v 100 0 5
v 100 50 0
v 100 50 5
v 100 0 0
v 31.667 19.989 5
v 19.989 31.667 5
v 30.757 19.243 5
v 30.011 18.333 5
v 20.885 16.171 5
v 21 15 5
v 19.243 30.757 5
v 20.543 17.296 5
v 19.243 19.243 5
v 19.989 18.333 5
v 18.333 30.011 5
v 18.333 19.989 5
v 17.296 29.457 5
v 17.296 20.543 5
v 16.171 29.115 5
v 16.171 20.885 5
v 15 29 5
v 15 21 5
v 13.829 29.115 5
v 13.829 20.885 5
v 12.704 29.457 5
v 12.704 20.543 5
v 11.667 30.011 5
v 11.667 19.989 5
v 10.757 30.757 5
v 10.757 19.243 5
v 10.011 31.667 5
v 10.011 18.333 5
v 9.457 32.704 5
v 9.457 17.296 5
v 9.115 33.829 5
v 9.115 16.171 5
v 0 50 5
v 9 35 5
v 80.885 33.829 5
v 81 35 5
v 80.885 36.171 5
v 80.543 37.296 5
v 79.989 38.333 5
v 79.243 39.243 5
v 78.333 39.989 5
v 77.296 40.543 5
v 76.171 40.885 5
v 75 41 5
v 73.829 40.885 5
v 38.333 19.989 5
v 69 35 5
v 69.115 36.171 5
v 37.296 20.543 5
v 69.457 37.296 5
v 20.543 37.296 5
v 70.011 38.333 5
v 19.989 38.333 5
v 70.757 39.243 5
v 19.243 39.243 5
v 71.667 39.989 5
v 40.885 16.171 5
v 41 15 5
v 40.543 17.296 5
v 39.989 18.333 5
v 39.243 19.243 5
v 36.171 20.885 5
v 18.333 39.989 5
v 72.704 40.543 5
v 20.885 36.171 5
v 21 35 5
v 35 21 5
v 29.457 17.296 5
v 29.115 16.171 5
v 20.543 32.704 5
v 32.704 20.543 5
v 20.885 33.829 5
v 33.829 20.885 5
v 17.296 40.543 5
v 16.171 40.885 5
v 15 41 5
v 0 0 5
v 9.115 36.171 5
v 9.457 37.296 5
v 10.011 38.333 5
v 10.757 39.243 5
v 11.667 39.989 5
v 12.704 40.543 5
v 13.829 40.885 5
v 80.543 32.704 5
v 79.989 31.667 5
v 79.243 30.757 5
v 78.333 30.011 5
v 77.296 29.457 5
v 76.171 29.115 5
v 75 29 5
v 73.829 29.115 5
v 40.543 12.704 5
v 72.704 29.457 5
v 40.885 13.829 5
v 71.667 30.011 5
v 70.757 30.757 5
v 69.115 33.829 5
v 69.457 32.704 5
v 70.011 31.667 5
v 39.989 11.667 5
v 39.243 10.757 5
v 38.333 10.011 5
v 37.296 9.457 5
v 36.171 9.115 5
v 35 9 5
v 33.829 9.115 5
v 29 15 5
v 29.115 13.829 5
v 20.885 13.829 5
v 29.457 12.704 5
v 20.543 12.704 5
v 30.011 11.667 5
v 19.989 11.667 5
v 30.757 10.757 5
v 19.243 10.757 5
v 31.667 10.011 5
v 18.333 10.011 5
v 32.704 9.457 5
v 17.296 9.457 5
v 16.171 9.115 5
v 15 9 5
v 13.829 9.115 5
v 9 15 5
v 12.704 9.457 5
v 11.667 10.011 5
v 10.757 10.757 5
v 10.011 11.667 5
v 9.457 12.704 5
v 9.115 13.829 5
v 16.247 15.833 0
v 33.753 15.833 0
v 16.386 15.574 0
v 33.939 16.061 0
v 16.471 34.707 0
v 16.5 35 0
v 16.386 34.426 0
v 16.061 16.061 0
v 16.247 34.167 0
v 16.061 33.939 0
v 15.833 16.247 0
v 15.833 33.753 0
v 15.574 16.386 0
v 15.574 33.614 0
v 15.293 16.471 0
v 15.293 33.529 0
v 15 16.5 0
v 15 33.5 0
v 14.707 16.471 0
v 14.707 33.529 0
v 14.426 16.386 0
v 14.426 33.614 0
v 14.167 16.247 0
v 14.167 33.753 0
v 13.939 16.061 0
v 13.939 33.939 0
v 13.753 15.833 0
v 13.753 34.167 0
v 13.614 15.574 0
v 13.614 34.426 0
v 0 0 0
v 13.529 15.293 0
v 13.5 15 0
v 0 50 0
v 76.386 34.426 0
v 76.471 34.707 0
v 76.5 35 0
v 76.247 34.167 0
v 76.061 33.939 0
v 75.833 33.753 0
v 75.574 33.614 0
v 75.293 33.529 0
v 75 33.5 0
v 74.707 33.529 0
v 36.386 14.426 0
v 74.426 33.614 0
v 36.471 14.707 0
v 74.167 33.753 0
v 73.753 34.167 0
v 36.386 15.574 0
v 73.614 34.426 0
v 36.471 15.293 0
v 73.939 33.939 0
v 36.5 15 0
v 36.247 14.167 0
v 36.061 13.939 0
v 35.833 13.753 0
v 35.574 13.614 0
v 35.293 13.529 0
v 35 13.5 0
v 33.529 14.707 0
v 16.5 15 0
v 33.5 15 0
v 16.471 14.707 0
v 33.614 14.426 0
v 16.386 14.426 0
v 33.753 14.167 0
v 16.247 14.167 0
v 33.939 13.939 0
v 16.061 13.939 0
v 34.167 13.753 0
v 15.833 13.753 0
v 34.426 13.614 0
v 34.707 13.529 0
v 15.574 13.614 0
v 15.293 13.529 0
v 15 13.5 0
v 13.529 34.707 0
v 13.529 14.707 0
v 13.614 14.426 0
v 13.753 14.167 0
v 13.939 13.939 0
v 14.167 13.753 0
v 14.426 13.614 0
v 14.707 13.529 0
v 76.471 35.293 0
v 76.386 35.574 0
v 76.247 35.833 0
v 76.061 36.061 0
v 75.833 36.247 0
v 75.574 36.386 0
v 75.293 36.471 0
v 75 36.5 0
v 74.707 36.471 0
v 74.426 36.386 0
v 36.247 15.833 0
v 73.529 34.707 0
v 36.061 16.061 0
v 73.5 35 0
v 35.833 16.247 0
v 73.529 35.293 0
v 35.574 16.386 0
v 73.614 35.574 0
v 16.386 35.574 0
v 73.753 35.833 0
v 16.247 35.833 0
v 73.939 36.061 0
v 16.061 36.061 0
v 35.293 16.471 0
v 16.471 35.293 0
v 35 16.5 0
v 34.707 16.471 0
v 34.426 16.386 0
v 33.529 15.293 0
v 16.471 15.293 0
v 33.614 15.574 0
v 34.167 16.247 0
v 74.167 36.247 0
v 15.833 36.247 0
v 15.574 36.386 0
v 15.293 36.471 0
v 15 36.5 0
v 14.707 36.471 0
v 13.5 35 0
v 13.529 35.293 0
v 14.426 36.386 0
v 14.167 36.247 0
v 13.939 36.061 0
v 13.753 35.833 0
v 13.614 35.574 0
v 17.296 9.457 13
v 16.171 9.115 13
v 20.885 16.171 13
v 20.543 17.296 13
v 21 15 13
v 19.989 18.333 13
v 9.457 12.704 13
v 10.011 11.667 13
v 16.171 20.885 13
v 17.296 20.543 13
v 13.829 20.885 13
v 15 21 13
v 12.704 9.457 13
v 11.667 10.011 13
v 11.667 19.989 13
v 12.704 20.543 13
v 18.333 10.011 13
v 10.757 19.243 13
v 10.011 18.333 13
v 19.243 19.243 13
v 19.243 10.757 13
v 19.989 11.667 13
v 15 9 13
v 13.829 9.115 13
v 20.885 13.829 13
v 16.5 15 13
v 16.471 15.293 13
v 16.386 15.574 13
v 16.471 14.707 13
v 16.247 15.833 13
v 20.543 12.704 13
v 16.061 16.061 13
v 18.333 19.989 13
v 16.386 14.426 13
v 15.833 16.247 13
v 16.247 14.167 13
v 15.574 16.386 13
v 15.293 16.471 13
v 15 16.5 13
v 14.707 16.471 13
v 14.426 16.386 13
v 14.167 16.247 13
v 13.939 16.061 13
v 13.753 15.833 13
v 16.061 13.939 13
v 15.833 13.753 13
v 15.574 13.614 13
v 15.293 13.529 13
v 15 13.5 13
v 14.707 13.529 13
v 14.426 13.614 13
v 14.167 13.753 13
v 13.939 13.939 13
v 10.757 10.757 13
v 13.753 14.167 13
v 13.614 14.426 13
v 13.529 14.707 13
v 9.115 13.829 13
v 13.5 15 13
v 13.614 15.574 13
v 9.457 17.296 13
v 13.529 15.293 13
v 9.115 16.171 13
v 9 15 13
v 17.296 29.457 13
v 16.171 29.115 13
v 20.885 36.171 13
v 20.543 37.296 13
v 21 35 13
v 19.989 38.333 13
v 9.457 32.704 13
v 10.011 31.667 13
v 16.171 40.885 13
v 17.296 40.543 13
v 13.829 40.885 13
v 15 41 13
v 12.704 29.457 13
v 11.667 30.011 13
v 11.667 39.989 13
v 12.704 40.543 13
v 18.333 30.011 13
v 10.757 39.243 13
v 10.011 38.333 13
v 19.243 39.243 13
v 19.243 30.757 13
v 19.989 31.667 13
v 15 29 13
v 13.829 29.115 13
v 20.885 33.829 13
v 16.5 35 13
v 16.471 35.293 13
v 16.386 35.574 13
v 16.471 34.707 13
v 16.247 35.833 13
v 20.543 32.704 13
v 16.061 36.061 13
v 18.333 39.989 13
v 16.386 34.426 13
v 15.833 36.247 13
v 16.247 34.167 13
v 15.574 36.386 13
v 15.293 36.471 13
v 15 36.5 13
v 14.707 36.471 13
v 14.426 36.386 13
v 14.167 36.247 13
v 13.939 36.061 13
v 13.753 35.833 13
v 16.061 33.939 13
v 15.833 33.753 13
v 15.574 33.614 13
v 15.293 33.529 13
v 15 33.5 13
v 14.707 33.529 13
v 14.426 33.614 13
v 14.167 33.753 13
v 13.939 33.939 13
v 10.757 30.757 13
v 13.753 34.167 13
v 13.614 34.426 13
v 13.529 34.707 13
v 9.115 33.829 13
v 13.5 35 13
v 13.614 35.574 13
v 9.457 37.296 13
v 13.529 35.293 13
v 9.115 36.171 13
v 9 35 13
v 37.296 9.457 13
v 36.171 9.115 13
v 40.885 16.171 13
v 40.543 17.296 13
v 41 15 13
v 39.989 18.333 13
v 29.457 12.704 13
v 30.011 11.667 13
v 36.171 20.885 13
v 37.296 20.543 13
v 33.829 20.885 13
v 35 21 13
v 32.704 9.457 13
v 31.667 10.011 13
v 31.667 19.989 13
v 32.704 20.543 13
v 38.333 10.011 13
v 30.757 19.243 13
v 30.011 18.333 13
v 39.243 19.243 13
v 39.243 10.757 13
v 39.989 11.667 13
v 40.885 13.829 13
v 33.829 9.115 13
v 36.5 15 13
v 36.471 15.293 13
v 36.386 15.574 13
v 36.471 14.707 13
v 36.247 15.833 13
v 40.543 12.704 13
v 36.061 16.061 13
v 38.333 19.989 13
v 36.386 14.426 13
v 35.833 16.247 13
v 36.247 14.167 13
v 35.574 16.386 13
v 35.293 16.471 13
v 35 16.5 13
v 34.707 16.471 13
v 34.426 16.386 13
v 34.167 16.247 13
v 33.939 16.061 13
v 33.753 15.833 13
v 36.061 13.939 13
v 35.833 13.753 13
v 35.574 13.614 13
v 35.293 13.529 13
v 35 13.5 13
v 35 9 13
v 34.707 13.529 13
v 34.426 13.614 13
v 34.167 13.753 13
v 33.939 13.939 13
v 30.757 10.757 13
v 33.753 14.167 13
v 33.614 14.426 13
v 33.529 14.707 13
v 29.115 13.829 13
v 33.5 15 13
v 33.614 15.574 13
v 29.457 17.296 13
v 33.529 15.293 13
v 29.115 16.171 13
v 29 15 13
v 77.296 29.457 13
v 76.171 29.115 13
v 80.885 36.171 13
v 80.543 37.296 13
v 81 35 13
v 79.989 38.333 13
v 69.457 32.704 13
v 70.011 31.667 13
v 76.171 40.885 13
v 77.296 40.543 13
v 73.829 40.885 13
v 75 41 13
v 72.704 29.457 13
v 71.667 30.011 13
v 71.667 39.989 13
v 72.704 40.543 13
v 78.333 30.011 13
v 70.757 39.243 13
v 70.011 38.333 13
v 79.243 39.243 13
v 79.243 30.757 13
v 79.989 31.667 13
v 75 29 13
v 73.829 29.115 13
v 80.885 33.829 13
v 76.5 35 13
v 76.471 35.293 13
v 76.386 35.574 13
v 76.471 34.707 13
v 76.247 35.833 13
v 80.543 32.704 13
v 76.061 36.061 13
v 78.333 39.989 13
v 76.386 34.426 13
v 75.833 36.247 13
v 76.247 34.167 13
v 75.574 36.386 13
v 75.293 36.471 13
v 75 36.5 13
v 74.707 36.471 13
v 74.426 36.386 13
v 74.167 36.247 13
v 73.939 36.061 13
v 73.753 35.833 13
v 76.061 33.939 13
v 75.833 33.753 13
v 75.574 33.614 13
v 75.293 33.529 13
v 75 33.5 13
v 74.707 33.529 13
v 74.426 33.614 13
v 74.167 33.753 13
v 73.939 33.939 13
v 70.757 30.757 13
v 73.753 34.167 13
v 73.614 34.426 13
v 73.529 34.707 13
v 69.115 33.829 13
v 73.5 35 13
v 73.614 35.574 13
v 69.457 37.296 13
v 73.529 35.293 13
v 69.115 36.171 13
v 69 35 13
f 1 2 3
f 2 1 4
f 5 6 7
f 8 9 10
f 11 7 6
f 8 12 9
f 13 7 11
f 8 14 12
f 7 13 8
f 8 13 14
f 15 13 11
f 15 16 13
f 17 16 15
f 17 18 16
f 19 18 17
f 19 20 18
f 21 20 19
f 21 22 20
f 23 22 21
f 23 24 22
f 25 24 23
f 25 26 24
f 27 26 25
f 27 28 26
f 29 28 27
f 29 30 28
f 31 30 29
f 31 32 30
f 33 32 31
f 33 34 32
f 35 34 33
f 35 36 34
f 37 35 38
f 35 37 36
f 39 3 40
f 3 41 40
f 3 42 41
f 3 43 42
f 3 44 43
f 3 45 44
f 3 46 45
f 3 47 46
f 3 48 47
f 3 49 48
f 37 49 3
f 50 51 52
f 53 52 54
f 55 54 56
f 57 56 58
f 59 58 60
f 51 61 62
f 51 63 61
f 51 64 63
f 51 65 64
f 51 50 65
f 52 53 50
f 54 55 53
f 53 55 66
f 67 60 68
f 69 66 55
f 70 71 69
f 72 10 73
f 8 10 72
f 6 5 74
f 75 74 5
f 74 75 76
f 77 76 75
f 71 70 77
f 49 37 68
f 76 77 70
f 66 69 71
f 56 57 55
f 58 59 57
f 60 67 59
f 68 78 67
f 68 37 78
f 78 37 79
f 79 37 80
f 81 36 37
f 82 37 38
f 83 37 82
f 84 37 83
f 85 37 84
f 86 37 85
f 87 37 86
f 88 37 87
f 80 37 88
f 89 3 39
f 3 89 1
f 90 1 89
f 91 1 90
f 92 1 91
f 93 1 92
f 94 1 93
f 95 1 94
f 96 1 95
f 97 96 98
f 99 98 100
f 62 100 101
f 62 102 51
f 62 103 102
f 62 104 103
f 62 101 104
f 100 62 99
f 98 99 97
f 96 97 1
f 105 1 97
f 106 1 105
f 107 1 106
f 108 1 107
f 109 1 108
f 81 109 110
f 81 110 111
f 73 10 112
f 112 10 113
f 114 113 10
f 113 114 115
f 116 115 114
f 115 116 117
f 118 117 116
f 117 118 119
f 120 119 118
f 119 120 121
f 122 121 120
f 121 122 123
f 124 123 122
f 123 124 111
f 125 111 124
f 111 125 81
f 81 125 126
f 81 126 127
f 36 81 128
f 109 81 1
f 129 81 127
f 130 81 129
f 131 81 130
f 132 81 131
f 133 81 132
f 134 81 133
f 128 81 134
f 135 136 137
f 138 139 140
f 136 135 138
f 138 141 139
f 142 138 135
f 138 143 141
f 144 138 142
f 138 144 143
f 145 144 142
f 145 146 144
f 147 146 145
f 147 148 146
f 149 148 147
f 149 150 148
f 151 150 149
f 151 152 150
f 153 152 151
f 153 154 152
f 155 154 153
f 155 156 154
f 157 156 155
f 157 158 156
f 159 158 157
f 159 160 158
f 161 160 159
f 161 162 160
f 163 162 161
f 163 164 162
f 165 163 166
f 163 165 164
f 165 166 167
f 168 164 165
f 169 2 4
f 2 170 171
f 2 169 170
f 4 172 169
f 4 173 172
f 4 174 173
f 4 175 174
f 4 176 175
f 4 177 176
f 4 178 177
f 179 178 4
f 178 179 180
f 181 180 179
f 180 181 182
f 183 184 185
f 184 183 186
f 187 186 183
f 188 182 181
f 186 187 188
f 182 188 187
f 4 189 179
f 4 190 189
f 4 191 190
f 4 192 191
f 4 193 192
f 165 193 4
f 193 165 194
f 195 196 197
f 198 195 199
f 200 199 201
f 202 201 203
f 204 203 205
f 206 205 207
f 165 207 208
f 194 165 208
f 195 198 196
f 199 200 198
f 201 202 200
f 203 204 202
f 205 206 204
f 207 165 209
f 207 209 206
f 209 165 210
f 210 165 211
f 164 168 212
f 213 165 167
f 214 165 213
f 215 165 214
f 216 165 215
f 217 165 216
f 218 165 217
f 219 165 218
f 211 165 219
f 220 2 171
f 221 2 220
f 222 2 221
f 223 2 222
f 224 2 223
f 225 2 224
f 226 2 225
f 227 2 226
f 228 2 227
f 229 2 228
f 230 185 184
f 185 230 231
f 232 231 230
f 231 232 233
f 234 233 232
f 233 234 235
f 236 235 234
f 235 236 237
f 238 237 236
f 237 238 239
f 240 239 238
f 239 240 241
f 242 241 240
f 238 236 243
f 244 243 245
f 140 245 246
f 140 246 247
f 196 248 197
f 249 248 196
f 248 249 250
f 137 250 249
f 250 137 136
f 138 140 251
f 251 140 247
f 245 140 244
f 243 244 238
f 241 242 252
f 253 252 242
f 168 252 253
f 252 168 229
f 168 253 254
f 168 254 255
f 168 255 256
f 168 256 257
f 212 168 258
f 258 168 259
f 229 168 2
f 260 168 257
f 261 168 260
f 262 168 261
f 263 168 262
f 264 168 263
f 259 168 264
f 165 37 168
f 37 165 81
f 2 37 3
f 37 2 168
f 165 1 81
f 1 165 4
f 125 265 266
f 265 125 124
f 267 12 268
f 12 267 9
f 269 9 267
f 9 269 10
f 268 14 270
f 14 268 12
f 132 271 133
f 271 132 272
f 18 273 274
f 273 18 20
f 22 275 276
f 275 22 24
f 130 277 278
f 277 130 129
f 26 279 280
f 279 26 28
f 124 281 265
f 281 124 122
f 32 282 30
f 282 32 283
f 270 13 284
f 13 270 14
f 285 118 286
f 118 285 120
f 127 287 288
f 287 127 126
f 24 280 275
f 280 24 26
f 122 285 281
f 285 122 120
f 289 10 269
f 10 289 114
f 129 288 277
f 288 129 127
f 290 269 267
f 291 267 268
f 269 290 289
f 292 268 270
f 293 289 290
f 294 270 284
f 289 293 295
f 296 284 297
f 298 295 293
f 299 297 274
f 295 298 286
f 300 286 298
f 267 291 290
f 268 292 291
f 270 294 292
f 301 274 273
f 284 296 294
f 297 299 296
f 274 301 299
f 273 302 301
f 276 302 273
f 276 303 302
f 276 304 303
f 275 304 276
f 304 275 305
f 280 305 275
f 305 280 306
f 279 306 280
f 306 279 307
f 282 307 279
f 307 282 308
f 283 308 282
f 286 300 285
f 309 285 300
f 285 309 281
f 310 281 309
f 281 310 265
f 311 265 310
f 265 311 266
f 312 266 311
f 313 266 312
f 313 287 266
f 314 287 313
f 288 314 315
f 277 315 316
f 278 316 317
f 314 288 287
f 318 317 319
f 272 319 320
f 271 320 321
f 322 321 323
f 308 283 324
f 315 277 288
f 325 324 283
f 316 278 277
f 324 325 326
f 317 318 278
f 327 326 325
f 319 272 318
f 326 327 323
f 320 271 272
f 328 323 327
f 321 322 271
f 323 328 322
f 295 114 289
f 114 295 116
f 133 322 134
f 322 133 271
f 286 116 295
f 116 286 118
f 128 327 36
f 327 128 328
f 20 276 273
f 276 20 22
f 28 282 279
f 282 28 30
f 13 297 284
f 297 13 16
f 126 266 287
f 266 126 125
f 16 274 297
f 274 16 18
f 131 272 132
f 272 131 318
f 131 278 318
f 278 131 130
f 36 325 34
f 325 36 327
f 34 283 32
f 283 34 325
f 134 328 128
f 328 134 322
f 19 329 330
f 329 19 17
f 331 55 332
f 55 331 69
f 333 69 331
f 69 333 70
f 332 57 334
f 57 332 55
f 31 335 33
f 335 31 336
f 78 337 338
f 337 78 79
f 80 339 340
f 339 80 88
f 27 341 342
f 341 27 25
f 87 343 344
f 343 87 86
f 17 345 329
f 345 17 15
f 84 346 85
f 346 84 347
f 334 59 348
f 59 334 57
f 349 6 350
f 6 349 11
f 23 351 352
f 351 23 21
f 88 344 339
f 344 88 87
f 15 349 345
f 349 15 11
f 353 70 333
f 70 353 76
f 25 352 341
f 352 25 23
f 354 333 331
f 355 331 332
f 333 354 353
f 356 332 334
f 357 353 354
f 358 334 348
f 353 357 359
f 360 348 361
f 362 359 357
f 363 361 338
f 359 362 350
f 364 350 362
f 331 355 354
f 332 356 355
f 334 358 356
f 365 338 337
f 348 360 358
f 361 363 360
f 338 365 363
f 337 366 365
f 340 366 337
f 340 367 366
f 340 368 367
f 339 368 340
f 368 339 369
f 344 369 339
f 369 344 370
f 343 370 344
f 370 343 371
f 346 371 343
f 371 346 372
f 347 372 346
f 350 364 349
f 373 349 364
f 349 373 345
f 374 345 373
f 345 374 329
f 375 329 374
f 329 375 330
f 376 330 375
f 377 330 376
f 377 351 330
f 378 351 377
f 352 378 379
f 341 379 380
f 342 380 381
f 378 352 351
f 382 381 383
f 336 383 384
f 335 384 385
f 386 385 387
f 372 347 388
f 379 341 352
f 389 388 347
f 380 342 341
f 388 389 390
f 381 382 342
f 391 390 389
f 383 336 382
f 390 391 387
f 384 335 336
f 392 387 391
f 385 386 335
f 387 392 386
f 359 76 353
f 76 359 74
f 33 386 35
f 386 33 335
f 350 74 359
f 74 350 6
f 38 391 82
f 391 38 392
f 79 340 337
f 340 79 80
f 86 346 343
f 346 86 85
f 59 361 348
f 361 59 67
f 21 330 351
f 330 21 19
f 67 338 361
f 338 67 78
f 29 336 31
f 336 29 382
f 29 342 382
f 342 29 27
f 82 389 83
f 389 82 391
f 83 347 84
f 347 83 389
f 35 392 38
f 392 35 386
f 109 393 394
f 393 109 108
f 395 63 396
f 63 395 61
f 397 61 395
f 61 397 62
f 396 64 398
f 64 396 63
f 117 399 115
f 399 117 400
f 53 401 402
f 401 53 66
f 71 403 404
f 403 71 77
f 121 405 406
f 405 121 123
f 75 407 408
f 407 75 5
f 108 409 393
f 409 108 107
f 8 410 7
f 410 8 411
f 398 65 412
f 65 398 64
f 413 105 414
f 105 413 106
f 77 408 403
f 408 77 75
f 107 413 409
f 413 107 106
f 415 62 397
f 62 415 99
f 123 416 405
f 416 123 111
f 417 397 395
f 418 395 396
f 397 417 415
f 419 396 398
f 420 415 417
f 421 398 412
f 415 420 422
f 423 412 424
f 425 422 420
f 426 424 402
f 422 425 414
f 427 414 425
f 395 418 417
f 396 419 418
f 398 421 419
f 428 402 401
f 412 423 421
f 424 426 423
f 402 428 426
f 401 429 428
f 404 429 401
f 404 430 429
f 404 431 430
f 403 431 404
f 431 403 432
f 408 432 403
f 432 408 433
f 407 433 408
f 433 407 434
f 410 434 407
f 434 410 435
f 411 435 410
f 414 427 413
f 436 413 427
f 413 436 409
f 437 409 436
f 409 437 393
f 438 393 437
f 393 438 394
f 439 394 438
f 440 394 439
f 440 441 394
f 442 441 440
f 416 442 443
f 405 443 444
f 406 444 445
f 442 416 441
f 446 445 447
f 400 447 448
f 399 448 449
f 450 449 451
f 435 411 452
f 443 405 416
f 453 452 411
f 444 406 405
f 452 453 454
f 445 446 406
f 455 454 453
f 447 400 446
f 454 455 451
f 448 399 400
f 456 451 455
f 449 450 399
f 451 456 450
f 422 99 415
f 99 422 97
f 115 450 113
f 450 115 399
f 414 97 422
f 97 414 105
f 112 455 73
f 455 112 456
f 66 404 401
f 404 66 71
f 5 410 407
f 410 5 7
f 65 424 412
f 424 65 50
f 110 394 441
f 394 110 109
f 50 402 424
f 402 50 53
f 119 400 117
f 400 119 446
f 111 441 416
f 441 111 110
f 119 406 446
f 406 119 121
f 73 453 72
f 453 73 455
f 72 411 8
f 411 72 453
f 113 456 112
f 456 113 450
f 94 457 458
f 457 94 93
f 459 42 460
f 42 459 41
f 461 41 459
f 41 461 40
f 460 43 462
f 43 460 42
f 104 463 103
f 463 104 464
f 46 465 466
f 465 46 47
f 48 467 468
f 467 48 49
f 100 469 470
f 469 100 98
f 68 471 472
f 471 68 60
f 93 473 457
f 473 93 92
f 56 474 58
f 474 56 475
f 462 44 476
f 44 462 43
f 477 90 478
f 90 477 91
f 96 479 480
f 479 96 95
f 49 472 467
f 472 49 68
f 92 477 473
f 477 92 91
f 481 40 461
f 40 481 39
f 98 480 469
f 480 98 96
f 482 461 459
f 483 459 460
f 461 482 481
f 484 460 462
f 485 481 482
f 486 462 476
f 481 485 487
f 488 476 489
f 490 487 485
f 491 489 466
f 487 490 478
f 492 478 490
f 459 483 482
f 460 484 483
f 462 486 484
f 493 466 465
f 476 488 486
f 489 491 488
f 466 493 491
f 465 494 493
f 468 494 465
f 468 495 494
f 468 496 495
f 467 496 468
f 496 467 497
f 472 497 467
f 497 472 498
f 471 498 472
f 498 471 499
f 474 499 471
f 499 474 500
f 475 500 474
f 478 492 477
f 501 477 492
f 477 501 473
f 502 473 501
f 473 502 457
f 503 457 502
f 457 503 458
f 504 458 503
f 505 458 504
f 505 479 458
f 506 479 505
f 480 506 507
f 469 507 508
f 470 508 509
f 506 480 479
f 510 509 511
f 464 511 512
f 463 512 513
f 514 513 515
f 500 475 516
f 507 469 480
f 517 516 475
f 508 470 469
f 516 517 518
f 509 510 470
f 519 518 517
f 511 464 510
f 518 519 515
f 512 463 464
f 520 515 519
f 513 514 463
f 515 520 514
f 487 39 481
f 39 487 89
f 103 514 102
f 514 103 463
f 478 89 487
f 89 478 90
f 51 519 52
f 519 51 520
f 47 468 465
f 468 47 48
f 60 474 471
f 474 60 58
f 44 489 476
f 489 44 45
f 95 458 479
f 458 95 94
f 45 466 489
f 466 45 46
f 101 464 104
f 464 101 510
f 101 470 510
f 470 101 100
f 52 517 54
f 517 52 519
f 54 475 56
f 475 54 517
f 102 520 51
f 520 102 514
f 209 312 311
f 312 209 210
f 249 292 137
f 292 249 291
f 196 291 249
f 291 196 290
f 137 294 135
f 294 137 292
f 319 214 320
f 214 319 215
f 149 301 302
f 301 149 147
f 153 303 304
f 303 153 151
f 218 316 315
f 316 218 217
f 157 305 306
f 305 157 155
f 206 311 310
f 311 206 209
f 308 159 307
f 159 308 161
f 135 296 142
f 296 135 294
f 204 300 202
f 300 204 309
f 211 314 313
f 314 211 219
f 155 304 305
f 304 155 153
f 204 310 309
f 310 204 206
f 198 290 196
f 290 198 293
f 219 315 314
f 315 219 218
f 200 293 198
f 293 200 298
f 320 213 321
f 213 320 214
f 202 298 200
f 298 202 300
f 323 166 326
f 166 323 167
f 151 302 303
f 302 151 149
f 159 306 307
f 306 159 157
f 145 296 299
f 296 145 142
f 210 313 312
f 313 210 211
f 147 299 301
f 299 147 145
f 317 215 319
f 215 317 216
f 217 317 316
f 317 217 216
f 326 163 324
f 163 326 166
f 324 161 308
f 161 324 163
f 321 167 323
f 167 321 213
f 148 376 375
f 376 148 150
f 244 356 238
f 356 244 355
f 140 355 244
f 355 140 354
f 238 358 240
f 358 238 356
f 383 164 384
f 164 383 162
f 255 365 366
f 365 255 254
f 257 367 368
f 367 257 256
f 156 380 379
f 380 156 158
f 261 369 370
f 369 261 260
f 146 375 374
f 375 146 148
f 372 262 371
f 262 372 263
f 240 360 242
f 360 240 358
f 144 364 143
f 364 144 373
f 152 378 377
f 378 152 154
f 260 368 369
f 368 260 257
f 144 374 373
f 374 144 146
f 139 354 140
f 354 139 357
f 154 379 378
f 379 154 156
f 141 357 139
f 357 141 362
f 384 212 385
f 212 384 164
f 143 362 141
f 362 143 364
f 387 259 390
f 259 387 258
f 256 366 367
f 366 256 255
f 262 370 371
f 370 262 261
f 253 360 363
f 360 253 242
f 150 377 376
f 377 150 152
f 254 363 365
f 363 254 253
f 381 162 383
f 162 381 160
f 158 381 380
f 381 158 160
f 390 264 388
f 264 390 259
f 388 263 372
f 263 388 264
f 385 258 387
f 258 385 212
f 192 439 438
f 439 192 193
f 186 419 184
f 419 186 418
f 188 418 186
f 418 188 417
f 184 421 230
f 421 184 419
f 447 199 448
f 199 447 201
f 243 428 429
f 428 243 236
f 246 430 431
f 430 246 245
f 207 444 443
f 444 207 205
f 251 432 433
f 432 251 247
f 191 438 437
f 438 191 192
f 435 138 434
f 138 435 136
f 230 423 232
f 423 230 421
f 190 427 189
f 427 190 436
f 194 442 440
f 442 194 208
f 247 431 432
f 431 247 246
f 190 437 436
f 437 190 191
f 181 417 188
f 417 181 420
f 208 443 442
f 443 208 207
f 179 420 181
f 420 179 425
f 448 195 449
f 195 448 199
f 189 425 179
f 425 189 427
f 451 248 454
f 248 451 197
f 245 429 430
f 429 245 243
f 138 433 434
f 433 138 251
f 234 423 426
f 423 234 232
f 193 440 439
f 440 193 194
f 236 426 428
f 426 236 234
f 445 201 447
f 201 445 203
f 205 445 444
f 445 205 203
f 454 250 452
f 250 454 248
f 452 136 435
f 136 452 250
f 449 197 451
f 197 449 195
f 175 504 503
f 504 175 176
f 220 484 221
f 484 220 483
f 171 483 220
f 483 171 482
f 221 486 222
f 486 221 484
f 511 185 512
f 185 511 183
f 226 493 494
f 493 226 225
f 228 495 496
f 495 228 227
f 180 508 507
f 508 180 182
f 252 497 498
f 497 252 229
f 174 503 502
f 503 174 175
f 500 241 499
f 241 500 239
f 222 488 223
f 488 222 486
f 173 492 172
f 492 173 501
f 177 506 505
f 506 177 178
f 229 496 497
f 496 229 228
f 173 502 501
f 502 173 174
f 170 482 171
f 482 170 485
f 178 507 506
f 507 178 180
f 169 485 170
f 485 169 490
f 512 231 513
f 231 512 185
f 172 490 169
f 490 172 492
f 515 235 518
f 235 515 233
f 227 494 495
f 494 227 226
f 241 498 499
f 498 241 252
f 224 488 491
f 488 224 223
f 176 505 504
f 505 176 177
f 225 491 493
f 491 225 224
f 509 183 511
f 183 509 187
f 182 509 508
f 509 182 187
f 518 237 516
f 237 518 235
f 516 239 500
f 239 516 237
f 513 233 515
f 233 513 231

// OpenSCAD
$fn = 32;

// ----------------------------------------------------------------------
// Boss field: plate with bosses at given coordinates
// ----------------------------------------------------------------------

// --- parameters (mm) ---
plate_l = 100;            // plate length, X
plate_w = 50;             // plate width, Y
plate_t = 5;              // plate thickness, Z
boss_d = 12;              // boss diameter
boss_h = 8;               // boss height above the plate
bore_d = 3;               // boss bore

total_h = plate_t + boss_h;  // overall height

difference() {
  union() {
    cube([plate_l, plate_w, plate_t]);
    translate([15, 15, plate_t]) cylinder(h = boss_h, d = boss_d);
    translate([15, 35, plate_t]) cylinder(h = boss_h, d = boss_d);
    translate([35, 15, plate_t]) cylinder(h = boss_h, d = boss_d);
    translate([75, 35, plate_t]) cylinder(h = boss_h, d = boss_d);
  }
  translate([15, 15, -1]) cylinder(h = total_h + 2, d = bore_d);
  translate([15, 35, -1]) cylinder(h = total_h + 2, d = bore_d);
  translate([35, 15, -1]) cylinder(h = total_h + 2, d = bore_d);
  translate([75, 35, -1]) cylinder(h = total_h + 2, d = bore_d);
}
